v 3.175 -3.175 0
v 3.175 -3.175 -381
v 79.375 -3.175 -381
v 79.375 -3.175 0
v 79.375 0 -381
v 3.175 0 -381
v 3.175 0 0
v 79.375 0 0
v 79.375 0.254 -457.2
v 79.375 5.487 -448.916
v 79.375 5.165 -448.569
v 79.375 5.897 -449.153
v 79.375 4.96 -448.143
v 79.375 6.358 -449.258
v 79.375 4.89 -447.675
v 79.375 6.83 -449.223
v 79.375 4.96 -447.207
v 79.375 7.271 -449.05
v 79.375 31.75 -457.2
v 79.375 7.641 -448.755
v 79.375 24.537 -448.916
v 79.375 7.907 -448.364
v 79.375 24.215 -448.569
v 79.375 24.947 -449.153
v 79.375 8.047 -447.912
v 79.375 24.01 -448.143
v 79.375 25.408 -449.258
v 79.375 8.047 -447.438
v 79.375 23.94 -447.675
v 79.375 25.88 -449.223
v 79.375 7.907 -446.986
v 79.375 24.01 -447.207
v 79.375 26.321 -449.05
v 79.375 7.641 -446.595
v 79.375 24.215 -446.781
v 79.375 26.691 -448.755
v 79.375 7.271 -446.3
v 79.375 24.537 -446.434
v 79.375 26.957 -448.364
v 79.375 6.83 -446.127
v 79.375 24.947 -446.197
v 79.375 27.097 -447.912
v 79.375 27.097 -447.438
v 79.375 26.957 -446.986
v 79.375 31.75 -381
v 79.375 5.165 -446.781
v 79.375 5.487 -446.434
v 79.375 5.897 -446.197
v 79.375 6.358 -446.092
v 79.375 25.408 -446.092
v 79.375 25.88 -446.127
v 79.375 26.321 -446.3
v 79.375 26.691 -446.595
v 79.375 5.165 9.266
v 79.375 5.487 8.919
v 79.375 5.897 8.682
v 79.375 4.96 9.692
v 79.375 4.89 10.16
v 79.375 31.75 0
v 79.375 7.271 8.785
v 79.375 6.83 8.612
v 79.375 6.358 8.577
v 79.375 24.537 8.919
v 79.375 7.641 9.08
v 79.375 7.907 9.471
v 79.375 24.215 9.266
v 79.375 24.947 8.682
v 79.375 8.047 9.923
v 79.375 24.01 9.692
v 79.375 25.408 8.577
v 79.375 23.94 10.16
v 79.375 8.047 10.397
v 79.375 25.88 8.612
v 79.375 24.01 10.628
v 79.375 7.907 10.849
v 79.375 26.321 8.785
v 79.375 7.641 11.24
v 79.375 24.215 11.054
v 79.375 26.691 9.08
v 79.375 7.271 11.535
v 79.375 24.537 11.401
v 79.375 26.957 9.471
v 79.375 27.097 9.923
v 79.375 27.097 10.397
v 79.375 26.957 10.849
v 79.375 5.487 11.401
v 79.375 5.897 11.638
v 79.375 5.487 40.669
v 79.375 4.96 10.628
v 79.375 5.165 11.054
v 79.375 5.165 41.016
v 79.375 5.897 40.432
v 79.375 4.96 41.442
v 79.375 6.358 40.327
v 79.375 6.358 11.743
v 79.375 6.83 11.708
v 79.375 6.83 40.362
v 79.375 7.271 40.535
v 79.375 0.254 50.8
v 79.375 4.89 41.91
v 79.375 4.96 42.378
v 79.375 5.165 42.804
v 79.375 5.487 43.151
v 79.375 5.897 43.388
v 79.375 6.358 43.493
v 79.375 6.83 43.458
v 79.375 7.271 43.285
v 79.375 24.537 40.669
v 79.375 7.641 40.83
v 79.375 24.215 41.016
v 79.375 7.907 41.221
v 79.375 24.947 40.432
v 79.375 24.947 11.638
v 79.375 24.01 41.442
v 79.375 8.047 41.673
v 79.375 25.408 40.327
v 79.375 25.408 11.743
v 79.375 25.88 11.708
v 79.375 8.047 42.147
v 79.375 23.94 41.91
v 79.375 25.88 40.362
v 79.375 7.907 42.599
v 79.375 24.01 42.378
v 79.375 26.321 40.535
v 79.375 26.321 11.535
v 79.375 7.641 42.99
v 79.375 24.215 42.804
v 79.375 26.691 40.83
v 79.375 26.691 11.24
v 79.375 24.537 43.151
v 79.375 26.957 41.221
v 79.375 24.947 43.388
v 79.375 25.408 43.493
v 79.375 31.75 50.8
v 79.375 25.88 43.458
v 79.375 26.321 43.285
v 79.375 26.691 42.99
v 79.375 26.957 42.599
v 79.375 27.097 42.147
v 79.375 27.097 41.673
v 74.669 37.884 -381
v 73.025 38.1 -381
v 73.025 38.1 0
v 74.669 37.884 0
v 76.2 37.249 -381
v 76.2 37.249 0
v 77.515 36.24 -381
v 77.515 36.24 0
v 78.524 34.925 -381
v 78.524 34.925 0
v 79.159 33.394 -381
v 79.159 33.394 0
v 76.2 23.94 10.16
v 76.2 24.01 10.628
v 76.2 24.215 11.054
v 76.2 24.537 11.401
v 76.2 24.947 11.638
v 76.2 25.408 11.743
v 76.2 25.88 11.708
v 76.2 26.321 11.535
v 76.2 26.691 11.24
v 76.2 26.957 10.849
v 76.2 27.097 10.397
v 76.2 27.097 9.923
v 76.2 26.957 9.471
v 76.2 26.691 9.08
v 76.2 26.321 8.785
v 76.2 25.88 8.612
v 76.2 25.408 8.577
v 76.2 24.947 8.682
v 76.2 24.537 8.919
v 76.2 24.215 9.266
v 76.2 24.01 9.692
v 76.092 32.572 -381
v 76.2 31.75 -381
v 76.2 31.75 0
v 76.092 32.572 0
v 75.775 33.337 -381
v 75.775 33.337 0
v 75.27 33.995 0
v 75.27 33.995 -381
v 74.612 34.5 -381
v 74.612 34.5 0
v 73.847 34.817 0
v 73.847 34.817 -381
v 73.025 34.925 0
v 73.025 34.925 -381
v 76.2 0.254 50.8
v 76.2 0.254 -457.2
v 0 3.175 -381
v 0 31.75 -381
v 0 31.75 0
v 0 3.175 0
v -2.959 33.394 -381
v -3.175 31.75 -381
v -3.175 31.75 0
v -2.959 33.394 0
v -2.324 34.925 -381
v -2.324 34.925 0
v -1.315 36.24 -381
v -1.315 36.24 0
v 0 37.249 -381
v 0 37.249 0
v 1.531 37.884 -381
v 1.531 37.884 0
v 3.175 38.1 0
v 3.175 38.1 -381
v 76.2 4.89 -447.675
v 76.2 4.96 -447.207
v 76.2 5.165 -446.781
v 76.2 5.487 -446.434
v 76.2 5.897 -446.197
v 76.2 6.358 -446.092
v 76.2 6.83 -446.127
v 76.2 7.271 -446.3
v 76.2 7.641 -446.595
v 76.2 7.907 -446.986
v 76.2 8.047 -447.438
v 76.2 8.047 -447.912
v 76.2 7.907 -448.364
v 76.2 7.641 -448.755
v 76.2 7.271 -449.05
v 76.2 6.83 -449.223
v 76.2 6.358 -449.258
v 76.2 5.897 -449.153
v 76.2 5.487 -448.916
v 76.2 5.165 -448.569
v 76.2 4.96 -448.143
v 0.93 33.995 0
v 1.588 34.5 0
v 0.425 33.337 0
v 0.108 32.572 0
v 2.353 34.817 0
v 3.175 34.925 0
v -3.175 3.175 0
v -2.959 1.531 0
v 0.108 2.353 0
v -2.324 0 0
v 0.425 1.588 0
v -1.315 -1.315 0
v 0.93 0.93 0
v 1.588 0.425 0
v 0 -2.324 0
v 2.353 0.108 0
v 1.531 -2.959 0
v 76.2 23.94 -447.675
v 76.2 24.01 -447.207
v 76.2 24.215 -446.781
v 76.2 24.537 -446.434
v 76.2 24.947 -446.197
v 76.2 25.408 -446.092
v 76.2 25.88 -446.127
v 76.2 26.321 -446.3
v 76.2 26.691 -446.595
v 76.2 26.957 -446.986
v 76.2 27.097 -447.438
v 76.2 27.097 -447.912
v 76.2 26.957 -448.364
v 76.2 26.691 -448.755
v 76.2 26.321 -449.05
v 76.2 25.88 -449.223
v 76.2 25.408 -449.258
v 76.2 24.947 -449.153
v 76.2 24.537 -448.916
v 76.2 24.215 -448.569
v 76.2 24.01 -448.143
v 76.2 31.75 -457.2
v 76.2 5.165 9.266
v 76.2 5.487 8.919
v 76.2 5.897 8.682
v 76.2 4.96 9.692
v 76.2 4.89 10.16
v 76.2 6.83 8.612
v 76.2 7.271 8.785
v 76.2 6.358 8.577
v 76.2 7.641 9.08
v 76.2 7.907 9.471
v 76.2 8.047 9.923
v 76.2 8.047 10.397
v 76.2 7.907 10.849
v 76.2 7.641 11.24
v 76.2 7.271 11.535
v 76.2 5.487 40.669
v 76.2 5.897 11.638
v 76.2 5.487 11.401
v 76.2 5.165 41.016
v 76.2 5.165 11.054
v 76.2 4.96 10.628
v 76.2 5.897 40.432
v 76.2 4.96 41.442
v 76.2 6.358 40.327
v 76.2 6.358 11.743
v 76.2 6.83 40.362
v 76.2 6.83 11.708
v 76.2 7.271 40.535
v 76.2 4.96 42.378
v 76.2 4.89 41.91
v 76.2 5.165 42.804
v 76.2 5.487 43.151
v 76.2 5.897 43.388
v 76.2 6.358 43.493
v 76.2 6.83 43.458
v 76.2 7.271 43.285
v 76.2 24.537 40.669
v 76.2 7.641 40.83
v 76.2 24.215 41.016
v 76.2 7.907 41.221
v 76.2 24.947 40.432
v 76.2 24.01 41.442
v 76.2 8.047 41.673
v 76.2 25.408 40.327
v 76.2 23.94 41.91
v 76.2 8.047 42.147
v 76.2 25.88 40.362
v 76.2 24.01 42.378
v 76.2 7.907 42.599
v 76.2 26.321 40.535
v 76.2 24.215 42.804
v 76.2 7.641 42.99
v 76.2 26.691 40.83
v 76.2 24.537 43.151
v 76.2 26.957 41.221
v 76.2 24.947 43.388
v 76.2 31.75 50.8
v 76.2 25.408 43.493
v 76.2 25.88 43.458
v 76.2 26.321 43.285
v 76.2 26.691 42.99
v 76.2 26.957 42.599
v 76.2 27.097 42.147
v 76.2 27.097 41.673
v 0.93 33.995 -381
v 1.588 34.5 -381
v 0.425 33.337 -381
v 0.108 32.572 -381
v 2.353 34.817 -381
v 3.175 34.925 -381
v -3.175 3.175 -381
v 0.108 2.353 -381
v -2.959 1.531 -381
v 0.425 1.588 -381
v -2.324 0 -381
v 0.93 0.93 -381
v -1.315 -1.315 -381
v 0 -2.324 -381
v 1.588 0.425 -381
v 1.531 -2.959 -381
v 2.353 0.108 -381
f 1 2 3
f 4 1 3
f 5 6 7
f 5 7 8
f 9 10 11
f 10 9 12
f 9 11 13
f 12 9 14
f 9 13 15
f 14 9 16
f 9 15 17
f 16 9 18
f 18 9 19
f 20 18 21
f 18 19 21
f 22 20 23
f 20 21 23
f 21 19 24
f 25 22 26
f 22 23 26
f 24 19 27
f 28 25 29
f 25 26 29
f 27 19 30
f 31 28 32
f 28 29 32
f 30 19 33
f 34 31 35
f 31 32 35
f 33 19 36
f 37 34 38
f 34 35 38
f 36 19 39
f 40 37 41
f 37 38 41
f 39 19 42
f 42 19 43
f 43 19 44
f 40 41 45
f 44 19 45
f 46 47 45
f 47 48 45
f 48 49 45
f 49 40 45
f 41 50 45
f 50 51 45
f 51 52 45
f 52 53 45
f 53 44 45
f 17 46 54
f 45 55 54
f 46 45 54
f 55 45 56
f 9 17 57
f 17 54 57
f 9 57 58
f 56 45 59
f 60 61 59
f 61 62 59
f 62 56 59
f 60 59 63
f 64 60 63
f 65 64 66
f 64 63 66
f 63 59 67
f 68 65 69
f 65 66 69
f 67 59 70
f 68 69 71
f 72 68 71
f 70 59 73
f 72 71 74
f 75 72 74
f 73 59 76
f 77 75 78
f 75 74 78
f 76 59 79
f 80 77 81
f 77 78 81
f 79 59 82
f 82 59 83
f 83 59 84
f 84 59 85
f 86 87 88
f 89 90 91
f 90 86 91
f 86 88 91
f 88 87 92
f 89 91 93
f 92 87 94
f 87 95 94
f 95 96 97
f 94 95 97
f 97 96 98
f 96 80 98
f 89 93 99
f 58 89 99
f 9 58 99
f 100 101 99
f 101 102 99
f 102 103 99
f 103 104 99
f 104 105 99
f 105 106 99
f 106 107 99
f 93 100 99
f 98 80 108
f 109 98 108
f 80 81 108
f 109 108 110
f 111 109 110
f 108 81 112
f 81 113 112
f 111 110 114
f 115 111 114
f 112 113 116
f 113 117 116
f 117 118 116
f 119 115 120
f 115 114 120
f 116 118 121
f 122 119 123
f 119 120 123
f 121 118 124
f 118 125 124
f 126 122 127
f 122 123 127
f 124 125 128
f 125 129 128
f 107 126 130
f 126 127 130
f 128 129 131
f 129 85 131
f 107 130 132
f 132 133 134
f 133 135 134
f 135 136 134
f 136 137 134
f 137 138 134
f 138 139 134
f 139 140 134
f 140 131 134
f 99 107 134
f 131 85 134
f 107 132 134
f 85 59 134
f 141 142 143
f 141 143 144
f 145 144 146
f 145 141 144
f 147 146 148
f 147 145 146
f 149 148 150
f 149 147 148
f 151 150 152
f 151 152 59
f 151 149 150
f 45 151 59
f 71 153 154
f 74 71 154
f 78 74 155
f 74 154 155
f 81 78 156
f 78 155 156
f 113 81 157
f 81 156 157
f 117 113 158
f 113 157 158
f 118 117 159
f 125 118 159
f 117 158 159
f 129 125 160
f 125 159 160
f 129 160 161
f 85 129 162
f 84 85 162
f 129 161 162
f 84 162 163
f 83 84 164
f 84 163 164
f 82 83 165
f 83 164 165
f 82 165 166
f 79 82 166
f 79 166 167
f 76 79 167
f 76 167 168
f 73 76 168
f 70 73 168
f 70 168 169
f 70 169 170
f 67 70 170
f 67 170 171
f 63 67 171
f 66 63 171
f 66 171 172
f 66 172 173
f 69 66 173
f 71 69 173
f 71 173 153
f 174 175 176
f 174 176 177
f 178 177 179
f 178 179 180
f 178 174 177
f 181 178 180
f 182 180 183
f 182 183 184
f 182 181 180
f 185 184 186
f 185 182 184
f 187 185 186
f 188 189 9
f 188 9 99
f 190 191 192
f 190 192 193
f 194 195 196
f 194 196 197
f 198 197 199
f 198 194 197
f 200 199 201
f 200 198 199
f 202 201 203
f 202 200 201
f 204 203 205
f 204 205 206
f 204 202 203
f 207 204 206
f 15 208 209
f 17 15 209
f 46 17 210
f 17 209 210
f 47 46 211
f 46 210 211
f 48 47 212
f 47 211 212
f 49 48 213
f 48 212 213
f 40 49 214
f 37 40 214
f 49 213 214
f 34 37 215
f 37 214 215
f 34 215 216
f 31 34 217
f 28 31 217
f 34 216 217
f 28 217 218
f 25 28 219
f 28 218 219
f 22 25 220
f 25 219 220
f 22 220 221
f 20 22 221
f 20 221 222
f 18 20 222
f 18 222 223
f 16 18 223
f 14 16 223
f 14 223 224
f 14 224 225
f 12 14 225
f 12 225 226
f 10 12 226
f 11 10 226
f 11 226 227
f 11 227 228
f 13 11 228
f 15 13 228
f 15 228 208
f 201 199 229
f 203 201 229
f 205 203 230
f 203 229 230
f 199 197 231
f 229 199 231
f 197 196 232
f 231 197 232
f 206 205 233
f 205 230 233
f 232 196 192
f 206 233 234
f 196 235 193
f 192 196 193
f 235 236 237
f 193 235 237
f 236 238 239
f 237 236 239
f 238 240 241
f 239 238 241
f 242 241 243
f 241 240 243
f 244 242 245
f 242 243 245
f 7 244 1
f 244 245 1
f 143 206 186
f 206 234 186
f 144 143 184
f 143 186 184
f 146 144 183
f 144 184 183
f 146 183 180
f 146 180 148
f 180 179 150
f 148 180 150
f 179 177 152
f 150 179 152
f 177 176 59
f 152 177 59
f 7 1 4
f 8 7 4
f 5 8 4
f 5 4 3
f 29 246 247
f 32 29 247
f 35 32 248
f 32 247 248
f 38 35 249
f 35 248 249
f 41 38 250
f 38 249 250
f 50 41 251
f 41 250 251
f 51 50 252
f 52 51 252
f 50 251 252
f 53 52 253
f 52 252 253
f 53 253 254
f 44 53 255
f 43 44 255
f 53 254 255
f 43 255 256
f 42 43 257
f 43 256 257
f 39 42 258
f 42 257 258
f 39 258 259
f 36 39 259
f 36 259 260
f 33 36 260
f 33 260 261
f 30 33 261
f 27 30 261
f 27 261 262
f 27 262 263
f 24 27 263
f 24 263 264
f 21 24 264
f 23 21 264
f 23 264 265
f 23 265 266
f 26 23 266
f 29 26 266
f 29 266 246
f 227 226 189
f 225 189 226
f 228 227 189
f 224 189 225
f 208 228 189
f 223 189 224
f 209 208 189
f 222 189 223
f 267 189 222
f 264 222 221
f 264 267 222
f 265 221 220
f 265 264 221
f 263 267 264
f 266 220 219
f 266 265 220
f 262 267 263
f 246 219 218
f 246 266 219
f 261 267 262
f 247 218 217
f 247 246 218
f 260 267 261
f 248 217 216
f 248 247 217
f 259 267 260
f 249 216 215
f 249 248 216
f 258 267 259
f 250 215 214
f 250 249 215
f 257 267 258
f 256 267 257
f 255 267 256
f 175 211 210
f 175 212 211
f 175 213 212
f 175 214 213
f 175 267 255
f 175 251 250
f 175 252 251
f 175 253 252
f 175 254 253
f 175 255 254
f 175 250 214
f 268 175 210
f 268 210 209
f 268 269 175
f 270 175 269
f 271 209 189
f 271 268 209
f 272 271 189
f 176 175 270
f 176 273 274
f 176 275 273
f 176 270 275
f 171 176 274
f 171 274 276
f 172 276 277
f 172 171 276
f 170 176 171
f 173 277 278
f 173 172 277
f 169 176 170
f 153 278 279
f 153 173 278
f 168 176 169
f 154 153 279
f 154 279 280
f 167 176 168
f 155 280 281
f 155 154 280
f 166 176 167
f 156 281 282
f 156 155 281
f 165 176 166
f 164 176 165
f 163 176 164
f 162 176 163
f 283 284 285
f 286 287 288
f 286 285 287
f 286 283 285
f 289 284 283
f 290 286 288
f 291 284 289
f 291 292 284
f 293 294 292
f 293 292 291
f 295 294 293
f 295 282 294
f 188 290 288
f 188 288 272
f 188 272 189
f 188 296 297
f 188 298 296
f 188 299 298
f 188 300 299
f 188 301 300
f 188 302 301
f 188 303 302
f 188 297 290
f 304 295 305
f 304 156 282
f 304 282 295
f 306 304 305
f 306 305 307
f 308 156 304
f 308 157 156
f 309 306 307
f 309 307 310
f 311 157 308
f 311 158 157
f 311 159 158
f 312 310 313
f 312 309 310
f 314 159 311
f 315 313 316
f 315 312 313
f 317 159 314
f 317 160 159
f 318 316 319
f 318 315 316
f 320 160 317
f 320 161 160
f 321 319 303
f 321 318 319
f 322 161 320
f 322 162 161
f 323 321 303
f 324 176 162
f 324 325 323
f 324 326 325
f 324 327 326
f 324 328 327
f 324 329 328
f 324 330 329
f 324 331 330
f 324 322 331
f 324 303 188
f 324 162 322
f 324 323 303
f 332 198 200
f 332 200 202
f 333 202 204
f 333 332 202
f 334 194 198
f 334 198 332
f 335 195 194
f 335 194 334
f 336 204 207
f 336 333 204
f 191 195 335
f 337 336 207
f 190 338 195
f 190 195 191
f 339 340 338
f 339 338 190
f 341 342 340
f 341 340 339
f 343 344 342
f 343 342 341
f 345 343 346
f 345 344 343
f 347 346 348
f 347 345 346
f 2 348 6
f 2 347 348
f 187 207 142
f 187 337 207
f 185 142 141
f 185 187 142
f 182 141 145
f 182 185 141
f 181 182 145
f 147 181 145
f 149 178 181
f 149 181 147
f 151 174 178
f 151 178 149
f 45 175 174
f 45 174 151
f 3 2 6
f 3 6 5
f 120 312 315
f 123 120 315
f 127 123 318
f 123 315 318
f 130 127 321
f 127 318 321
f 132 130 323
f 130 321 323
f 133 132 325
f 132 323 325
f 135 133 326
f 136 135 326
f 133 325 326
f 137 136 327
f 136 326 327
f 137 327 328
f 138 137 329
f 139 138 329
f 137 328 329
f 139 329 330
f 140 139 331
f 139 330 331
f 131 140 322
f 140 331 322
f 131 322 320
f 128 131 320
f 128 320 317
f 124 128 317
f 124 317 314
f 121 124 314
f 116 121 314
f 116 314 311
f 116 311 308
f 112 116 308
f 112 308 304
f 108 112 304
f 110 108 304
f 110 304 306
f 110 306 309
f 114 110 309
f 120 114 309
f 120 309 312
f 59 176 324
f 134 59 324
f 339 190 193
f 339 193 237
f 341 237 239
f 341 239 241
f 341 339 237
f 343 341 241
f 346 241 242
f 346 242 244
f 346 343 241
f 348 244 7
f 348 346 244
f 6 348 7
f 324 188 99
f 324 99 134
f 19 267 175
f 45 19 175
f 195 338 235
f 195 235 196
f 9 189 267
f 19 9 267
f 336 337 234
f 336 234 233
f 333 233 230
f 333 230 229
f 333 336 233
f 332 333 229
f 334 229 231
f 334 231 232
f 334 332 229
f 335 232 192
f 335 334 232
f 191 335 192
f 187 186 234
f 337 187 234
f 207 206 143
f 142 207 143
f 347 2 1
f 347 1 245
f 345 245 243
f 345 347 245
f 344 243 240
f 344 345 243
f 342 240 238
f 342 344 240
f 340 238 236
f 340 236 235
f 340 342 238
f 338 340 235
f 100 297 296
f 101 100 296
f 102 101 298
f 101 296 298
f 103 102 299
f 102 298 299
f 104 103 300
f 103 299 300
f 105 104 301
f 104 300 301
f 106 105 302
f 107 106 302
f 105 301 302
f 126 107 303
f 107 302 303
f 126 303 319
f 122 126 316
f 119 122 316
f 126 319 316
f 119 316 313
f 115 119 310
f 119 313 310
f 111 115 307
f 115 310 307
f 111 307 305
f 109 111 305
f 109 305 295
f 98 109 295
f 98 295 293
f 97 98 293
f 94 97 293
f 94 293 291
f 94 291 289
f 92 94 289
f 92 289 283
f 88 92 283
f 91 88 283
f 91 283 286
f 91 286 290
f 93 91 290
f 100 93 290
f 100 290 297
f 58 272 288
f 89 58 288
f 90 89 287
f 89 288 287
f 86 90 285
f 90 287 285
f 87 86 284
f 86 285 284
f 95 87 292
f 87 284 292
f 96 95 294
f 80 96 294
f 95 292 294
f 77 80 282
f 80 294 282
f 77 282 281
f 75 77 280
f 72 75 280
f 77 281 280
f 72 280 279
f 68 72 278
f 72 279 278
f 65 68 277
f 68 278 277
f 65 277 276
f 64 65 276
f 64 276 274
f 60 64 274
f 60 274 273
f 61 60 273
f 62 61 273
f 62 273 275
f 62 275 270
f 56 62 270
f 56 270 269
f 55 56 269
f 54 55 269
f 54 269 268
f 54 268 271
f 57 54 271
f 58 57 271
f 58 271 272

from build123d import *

# Parameters (mm, degrees)
SKETCH1_W                    = 79.375
SKETCH1_H                    = 381
BASE_FLANGE1_DEPTH           = 3.175
EDGE_FLANGE1_STRIP_W         = 19.05
EDGE_FLANGE1_STRIP_H         = 3.175
EDGE_FLANGE1_STRIP_CUT_DEPTH = 381
EDGE_FLANGE1_DEPTH           = 381
EDGE_FLANGE2_STRIP_W         = 19.05
EDGE_FLANGE2_STRIP_H         = 3.175
EDGE_FLANGE2_STRIP_CUT_DEPTH = 381
EDGE_FLANGE2_DEPTH           = 381
EDGE_FLANGE3_STRIP_W         = 19.05
EDGE_FLANGE3_STRIP_H         = 3.175
EDGE_FLANGE3_STRIP_CUT_DEPTH = 381
EDGE_FLANGE3_DEPTH           = 381
SKETCH24_W                   = 50.8
SKETCH24_H                   = 31.496
TAB3_DEPTH                   = 3.175
SKETCH27_W                   = 76.2
SKETCH27_H                   = 31.496
TAB4_DEPTH                   = 3.175
SKETCH30_R                   = 1.5875
CUT_EXTRUDE2_DEPTH           = 466.600516135
SKETCH31_R                   = 1.5875
CUT_EXTRUDE3_DEPTH           = 466.600516135


# Sheet-metal steps are written as plain solids
with BuildPart() as part:
    # Sketch1 → Base-Flange1 (new body)
    with BuildSketch(Plane(origin=(0, 0, 0), x_dir=(1, 0, 0), z_dir=(0, 1, 0))):
        with Locations((39.6875, 190.5)):
            Rectangle(SKETCH1_W, SKETCH1_H)
    extrude(amount=-BASE_FLANGE1_DEPTH)

    # Edge-Flange1 strip (across the edge) → Edge-Flange1 strip cut (cut)
    with BuildSketch(Plane.XY.offset(-381)):
        with Locations((-6.35, -1.5875)):
            Rectangle(EDGE_FLANGE1_STRIP_W, EDGE_FLANGE1_STRIP_H)
    extrude(amount=EDGE_FLANGE1_STRIP_CUT_DEPTH, mode=Mode.SUBTRACT)

    # Edge-Flange1 section (across the edge) → Edge-Flange1 (add)
    with BuildSketch(Plane.XY.offset(-381)):
        with BuildLine():
            Line((-3.175, 3.175), (-3.175, 34.925))
            Line((-3.175, 34.925), (0, 34.925))
            Line((0, 34.925), (0, 3.175))
            ThreePointArc((0, 3.175), (0.92993597, 0.92993597), (3.175, 0))
            Line((3.175, 0), (3.175, -3.175))
            ThreePointArc((3.175, -3.175), (-1.315128061, -1.315128061), (-3.175, 3.175))
        make_face()
    extrude(amount=EDGE_FLANGE1_DEPTH)

    # Edge-Flange2 strip (across the edge) → Edge-Flange2 strip cut (cut)
    with BuildSketch(Plane(origin=(0, 34.925, -381), x_dir=(0, -1, 0), z_dir=(0, 0, 1))):
        with Locations((-6.35, -1.5875)):
            Rectangle(EDGE_FLANGE2_STRIP_W, EDGE_FLANGE2_STRIP_H)
    extrude(amount=EDGE_FLANGE2_STRIP_CUT_DEPTH, mode=Mode.SUBTRACT)

    # Edge-Flange2 section (across the edge) → Edge-Flange2 (add)
    with BuildSketch(Plane(origin=(0, 34.925, -381), x_dir=(0, -1, 0), z_dir=(0, 0, 1))):
        with BuildLine():
            Line((-3.175, 3.175), (-3.175, 76.2))
            Line((-3.175, 76.2), (0, 76.2))
            Line((0, 76.2), (0, 3.175))
            ThreePointArc((0, 3.175), (0.92993597, 0.92993597), (3.175, 0))
            Line((3.175, 0), (3.175, -3.175))
            ThreePointArc((3.175, -3.175), (-1.315128061, -1.315128061), (-3.175, 3.175))
        make_face()
    extrude(amount=EDGE_FLANGE2_DEPTH)

    # Edge-Flange3 strip (across the edge) → Edge-Flange3 strip cut (cut)
    with BuildSketch(Plane(origin=(76.2, 34.925, -381), x_dir=(-1, 0, 0), z_dir=(0, 0, 1))):
        with Locations((-6.35, -1.5875)):
            Rectangle(EDGE_FLANGE3_STRIP_W, EDGE_FLANGE3_STRIP_H)
    extrude(amount=EDGE_FLANGE3_STRIP_CUT_DEPTH, mode=Mode.SUBTRACT)

    # Edge-Flange3 section (across the edge) → Edge-Flange3 (add)
    with BuildSketch(Plane(origin=(76.2, 34.925, -381), x_dir=(-1, 0, 0), z_dir=(0, 0, 1))):
        with BuildLine():
            Line((-3.175, 3.175), (-3.175, 34.671))
            Line((-3.175, 34.671), (0, 34.671))
            Line((0, 34.671), (0, 3.175))
            ThreePointArc((0, 3.175), (0.92993597, 0.92993597), (3.175, 0))
            Line((3.175, 0), (3.175, -3.175))
            ThreePointArc((3.175, -3.175), (-1.315128061, -1.315128061), (-3.175, 3.175))
        make_face()
    extrude(amount=EDGE_FLANGE3_DEPTH)

    # Sketch24 → Tab3 (add)
    with BuildSketch(Plane.ZY.offset(-76.2)):
        with Locations((25.4, 16.002)):
            Rectangle(SKETCH24_W, SKETCH24_H)
    extrude(amount=-TAB3_DEPTH)

    # Sketch27 → Tab4 (add)
    with BuildSketch(Plane.ZY.offset(-76.2)):
        with Locations((-419.1, 16.002)):
            Rectangle(SKETCH27_W, SKETCH27_H)
    extrude(amount=-TAB4_DEPTH)

    # Sketch30 → Cut-Extrude2 (cut, through all)
    with BuildSketch(Plane.ZY.offset(-76.2)):
        with Locations(Location((10.16, 25.527, 0), (0, 0, 270))):
            Circle(SKETCH30_R)
        with Locations(Location((41.91, 25.527, 0), (0, 0, 270))):
            Circle(SKETCH30_R)
        with Locations(Location((41.91, 6.477, 0), (0, 0, 270))):
            Circle(SKETCH30_R)
        with Locations(Location((10.16, 6.477, 0), (0, 0, 270))):
            Circle(SKETCH30_R)
    extrude(amount=-CUT_EXTRUDE2_DEPTH, mode=Mode.SUBTRACT)

    # Sketch31 → Cut-Extrude3 (cut, through all)
    with BuildSketch(Plane.ZY.offset(-76.2)):
        with Locations(Location((-447.675, 25.527, 0), (0, 0, 270))):
            Circle(SKETCH31_R)
        with Locations(Location((-447.675, 6.477, 0), (0, 0, 270))):
            Circle(SKETCH31_R)
    extrude(amount=-CUT_EXTRUDE3_DEPTH, mode=Mode.SUBTRACT)


solid = part.part
